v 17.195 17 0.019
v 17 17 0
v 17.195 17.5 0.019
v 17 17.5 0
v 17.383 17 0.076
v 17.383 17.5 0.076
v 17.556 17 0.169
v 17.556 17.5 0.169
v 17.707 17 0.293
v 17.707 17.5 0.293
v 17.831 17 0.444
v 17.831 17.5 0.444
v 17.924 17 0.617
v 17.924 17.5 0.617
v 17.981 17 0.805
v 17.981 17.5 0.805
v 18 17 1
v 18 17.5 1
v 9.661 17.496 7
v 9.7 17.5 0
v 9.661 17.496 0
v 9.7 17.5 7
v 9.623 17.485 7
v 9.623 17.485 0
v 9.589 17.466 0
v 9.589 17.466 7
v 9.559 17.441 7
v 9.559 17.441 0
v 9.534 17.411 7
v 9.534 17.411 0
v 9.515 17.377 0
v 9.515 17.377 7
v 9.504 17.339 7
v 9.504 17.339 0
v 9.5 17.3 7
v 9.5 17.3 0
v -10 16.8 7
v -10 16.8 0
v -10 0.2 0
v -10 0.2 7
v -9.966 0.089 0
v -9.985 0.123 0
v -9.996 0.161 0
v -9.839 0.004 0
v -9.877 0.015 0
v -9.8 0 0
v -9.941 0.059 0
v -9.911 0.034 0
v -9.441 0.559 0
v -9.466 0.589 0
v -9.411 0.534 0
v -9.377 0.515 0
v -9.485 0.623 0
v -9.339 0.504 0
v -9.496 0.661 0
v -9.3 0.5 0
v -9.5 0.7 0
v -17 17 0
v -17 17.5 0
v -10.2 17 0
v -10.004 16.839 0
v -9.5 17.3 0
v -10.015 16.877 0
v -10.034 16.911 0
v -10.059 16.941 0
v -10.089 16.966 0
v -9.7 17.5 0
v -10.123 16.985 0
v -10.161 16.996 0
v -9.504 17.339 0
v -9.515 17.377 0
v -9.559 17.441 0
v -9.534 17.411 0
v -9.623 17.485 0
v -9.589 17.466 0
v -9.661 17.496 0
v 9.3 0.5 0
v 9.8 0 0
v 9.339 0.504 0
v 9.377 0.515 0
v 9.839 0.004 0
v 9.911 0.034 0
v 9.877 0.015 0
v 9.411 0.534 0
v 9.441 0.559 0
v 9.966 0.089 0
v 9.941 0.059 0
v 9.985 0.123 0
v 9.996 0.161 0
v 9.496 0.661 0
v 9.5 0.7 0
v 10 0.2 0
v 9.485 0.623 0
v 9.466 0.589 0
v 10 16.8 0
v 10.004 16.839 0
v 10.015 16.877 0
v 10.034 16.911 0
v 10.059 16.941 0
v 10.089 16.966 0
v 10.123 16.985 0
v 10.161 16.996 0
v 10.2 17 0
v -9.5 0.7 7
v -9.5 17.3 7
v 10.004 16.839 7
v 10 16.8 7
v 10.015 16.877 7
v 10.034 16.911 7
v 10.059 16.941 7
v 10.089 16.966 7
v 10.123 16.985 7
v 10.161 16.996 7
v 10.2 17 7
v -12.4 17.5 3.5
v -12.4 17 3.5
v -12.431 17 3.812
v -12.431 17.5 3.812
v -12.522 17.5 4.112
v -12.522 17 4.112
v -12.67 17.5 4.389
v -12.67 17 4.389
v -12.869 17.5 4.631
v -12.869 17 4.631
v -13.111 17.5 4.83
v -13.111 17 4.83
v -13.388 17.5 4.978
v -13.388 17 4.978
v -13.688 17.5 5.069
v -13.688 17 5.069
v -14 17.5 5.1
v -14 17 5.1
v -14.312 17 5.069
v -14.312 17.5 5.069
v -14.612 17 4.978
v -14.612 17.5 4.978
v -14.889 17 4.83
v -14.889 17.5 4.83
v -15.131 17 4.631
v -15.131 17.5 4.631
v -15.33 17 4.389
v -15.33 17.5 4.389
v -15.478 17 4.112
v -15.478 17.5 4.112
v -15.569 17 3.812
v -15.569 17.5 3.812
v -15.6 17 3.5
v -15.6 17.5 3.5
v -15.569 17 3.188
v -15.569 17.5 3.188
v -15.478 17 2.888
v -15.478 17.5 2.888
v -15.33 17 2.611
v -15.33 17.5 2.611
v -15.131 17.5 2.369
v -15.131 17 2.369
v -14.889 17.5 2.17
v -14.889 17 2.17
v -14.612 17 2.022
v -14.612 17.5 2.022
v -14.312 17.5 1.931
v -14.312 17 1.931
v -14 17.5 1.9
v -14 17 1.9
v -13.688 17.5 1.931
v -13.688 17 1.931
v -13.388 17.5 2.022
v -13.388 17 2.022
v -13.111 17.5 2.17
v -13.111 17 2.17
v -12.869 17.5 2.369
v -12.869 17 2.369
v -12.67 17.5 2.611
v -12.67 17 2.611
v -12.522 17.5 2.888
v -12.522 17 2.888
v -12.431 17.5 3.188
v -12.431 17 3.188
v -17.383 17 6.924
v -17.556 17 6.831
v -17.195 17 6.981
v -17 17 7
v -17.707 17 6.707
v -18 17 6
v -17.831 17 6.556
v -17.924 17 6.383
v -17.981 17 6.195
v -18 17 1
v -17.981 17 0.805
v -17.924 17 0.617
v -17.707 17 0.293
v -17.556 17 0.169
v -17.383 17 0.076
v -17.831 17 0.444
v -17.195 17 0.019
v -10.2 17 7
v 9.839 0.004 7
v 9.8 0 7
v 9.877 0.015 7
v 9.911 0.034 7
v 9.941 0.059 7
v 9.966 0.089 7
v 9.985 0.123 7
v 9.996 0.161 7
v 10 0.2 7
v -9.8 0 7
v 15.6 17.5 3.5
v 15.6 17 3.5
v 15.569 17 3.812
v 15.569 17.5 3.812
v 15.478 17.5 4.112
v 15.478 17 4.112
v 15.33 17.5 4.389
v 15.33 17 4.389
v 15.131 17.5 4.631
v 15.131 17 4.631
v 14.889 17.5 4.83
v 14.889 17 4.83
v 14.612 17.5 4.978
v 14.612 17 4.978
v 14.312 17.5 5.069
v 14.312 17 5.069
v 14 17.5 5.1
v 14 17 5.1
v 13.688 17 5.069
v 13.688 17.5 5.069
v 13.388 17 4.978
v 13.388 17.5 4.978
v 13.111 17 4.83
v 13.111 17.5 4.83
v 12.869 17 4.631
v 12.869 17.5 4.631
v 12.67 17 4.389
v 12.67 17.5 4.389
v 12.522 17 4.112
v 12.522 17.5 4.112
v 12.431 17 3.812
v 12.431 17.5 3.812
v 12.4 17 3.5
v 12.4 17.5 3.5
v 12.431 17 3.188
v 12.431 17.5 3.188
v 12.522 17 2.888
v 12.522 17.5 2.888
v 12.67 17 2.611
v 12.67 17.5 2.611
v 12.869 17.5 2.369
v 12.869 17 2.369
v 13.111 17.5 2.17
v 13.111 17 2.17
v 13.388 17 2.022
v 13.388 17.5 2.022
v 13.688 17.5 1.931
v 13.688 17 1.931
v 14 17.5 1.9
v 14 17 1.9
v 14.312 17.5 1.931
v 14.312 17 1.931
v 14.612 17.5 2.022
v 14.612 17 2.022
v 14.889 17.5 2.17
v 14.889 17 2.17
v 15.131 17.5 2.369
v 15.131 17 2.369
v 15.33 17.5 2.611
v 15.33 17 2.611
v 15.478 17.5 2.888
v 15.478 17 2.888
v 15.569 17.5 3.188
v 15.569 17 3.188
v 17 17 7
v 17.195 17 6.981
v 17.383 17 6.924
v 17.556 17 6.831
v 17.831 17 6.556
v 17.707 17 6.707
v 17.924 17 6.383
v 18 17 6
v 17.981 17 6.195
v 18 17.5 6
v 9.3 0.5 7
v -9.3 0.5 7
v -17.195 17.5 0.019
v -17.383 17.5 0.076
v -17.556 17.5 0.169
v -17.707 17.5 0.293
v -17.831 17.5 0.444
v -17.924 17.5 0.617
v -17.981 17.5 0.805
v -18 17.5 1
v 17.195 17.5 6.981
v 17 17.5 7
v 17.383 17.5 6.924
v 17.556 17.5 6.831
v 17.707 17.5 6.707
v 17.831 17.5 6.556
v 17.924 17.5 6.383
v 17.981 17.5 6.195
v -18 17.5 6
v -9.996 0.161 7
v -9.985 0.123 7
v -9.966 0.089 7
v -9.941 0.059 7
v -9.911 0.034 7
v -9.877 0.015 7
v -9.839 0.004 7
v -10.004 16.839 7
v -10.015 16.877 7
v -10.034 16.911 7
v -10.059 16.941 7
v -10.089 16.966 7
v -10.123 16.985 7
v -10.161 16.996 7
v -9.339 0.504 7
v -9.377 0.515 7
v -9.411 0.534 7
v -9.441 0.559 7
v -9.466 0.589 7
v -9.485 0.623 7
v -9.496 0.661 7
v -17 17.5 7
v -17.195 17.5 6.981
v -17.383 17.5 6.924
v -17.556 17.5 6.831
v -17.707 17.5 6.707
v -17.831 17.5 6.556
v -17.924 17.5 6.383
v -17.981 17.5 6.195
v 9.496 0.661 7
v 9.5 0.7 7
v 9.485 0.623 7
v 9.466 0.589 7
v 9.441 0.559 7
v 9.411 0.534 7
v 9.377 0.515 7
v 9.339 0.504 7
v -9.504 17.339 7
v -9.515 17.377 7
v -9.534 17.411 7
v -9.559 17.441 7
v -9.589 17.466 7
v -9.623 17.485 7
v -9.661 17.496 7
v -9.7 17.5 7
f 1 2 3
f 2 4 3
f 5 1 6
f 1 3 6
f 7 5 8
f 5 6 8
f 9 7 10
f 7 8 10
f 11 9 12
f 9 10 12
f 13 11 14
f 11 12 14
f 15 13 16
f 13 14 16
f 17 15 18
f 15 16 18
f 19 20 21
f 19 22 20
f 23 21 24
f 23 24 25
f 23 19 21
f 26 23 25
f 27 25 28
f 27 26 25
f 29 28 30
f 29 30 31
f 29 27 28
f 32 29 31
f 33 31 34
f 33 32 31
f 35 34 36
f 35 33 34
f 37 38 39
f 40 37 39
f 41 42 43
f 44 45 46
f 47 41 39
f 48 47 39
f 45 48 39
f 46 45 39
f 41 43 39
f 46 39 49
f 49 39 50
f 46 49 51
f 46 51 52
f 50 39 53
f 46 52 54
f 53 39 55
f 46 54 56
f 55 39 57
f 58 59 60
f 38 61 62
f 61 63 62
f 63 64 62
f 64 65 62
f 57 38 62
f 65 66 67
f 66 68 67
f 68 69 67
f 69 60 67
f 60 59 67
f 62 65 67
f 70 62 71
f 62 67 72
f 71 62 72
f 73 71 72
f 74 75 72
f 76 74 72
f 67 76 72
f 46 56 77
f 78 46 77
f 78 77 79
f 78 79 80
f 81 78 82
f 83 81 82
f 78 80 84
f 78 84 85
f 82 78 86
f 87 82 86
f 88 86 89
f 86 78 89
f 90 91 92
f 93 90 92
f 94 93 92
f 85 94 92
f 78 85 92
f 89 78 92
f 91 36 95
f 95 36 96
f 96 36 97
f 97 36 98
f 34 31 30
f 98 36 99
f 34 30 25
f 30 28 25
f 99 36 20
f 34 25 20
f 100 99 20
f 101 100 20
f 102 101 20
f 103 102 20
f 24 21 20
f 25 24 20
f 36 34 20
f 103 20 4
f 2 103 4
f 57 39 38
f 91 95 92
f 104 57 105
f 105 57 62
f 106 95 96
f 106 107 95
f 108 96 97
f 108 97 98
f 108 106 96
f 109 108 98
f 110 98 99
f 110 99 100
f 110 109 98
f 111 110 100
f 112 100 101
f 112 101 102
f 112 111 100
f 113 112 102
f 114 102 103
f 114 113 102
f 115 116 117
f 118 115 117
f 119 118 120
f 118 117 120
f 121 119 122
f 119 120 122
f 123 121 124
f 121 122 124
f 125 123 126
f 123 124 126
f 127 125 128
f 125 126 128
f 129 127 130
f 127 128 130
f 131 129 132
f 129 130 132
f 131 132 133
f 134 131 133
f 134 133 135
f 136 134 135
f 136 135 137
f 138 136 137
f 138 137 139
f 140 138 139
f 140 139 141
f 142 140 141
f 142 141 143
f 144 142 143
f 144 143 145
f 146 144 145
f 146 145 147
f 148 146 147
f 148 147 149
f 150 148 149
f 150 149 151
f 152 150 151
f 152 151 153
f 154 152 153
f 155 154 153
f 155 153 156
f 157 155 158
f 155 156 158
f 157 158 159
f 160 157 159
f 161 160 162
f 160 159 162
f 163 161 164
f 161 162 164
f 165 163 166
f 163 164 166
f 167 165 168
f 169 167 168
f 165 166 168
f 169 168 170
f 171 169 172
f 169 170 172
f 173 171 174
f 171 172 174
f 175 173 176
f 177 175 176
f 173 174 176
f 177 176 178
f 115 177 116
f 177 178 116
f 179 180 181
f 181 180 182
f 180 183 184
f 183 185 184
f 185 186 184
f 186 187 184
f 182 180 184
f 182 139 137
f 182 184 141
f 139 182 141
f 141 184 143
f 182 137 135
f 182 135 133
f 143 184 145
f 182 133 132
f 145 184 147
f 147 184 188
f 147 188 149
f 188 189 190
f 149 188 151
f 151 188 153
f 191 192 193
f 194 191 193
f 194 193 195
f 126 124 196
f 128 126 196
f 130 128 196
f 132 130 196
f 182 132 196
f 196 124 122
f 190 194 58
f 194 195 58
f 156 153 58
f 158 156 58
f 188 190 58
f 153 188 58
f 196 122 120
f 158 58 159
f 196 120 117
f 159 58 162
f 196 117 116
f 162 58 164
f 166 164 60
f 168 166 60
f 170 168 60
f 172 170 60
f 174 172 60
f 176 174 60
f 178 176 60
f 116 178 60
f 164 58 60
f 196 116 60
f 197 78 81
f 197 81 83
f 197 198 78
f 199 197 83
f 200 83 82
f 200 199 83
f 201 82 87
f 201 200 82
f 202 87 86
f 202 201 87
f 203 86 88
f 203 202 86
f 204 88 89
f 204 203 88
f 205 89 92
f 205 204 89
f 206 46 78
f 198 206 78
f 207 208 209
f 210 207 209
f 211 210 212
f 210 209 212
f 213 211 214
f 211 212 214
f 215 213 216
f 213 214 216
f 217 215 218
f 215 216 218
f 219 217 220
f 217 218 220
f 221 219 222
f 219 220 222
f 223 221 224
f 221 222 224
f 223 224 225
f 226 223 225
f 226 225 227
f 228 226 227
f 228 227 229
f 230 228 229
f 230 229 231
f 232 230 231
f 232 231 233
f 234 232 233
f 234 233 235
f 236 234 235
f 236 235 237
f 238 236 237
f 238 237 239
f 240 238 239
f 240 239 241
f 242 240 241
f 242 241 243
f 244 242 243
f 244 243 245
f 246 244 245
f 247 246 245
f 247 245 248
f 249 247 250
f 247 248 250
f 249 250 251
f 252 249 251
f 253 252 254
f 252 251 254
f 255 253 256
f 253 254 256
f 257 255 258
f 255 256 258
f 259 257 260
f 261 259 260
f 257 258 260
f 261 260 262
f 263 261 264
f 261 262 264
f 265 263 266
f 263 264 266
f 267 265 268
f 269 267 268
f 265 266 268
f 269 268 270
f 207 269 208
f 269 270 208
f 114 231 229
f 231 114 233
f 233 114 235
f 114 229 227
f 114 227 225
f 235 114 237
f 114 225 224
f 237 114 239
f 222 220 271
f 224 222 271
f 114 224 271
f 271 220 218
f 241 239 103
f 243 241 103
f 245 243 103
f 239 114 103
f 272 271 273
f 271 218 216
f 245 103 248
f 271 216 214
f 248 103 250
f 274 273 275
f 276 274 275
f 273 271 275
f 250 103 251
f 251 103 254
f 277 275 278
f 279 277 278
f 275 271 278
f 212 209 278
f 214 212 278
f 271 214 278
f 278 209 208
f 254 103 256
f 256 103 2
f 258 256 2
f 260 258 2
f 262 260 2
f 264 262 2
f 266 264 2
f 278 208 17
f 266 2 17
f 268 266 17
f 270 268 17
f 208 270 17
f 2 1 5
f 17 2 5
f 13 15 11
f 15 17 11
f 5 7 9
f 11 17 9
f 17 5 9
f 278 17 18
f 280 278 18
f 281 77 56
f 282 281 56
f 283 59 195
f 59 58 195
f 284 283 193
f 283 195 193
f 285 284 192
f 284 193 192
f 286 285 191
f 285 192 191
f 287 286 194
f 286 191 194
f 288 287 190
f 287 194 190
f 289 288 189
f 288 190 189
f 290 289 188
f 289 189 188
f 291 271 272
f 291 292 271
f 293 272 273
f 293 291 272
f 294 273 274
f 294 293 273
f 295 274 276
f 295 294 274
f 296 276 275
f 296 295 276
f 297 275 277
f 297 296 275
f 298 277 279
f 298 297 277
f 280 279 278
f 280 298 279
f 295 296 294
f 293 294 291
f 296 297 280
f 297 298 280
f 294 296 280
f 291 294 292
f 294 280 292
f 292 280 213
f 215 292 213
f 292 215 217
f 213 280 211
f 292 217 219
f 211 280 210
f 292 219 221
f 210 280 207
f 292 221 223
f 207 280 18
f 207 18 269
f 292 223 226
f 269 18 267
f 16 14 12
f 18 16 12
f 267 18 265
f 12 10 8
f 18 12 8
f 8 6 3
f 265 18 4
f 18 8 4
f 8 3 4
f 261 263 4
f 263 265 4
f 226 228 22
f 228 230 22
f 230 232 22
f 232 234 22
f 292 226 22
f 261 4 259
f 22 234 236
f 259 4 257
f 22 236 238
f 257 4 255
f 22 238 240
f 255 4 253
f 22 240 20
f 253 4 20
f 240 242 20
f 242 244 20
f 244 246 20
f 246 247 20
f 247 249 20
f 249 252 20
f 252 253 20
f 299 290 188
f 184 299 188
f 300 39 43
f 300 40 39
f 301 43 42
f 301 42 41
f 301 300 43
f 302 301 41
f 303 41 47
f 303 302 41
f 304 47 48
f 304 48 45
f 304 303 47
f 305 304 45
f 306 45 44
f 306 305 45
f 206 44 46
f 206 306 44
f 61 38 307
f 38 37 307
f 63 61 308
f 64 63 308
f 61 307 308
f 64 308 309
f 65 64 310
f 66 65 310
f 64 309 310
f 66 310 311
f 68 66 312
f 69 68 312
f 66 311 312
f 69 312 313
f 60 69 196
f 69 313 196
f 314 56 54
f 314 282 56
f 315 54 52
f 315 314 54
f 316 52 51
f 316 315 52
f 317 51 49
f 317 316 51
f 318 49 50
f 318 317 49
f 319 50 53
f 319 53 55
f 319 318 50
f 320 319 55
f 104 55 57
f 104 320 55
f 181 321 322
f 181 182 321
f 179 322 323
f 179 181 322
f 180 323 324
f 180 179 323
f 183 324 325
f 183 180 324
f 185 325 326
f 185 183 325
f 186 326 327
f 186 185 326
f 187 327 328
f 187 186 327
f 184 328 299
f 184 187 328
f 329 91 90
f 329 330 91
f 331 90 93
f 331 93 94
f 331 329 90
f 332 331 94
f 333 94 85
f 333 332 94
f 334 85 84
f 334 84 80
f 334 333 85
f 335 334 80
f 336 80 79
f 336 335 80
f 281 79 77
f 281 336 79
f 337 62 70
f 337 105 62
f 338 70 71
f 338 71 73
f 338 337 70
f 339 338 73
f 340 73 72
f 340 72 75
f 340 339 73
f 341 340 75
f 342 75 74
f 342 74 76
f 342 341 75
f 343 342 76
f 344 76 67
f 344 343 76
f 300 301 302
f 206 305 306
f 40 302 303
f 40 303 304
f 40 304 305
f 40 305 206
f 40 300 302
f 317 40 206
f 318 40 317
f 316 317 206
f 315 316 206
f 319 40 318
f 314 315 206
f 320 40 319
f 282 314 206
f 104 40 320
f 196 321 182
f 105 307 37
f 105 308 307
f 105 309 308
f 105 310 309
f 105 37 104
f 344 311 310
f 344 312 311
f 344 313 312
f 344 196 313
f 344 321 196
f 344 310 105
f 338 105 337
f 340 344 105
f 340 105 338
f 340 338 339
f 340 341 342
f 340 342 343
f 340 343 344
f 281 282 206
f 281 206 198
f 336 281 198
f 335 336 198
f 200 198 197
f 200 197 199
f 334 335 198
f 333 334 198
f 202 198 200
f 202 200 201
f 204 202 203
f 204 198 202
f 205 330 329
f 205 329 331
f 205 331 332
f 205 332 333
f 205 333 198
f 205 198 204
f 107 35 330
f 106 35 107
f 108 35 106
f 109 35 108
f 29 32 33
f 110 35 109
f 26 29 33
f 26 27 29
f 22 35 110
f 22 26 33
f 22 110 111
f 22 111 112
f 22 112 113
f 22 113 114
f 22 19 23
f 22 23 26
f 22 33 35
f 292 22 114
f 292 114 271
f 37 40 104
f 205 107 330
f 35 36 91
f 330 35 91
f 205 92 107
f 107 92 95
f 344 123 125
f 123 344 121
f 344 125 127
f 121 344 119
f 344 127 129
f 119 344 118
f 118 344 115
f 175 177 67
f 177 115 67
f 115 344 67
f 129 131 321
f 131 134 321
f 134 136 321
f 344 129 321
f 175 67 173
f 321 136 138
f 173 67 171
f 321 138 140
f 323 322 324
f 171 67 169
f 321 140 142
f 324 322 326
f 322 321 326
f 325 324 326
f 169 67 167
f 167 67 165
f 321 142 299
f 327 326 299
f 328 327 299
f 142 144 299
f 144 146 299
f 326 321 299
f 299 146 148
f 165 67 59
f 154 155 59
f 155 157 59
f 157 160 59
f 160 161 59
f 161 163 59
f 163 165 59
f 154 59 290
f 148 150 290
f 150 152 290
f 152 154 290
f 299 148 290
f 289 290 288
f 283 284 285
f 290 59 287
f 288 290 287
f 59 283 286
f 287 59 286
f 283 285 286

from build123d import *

# Parameters (mm, degrees)
F1_DEPTH = 7
F2_R     = 0.2
F3_R     = 1.6
F4_DEPTH = 0.501
F5_R     = 1


with BuildPart() as f1:
    # F0 (on Top) → F1 (new body)
    with BuildSketch(Plane.XY):
        Polygon((-10, 17), (-10, 0), (10, 0), (10, 17), (18, 17), (18, 17.5), (9.5, 17.5), (9.5, 0.5), (-9.5, 0.5), (-9.5, 17.5), (-18, 17.5), (-18, 17), align=None)
    extrude(amount=F1_DEPTH)

    # F2
    f2_edges = [f1.edges().sort_by_distance(p)[0] for p in [
        (10, 0, 3.5),
        (-10, 0, 3.5),
        (-9.5, 0.5, 3.5),
        (9.5, 0.5, 3.5),
        (-9.5, 17.5, 3.5),
        (-10, 17, 3.5),
        (10, 17, 3.5),
        (9.5, 17.5, 3.5),
    ]]
    fillet(f2_edges, radius=F2_R)

    # F3 (on face) → F4 (cut, through all)
    with BuildSketch(Plane.XZ.offset(-17)):
        with Locations((14, 3.5)):
            Circle(F3_R)
        with Locations((-14, 3.5)):
            Circle(F3_R)
    extrude(amount=-F4_DEPTH, mode=Mode.SUBTRACT)

    # F5
    f5_edges = [f1.edges().sort_by_distance(p)[0] for p in [
        (18, 17.25, 7),
        (18, 17.25, 0),
        (-18, 17.25, 7),
        (-18, 17.25, 0),
    ]]
    fillet(f5_edges, radius=F5_R)


solid = f1.part
